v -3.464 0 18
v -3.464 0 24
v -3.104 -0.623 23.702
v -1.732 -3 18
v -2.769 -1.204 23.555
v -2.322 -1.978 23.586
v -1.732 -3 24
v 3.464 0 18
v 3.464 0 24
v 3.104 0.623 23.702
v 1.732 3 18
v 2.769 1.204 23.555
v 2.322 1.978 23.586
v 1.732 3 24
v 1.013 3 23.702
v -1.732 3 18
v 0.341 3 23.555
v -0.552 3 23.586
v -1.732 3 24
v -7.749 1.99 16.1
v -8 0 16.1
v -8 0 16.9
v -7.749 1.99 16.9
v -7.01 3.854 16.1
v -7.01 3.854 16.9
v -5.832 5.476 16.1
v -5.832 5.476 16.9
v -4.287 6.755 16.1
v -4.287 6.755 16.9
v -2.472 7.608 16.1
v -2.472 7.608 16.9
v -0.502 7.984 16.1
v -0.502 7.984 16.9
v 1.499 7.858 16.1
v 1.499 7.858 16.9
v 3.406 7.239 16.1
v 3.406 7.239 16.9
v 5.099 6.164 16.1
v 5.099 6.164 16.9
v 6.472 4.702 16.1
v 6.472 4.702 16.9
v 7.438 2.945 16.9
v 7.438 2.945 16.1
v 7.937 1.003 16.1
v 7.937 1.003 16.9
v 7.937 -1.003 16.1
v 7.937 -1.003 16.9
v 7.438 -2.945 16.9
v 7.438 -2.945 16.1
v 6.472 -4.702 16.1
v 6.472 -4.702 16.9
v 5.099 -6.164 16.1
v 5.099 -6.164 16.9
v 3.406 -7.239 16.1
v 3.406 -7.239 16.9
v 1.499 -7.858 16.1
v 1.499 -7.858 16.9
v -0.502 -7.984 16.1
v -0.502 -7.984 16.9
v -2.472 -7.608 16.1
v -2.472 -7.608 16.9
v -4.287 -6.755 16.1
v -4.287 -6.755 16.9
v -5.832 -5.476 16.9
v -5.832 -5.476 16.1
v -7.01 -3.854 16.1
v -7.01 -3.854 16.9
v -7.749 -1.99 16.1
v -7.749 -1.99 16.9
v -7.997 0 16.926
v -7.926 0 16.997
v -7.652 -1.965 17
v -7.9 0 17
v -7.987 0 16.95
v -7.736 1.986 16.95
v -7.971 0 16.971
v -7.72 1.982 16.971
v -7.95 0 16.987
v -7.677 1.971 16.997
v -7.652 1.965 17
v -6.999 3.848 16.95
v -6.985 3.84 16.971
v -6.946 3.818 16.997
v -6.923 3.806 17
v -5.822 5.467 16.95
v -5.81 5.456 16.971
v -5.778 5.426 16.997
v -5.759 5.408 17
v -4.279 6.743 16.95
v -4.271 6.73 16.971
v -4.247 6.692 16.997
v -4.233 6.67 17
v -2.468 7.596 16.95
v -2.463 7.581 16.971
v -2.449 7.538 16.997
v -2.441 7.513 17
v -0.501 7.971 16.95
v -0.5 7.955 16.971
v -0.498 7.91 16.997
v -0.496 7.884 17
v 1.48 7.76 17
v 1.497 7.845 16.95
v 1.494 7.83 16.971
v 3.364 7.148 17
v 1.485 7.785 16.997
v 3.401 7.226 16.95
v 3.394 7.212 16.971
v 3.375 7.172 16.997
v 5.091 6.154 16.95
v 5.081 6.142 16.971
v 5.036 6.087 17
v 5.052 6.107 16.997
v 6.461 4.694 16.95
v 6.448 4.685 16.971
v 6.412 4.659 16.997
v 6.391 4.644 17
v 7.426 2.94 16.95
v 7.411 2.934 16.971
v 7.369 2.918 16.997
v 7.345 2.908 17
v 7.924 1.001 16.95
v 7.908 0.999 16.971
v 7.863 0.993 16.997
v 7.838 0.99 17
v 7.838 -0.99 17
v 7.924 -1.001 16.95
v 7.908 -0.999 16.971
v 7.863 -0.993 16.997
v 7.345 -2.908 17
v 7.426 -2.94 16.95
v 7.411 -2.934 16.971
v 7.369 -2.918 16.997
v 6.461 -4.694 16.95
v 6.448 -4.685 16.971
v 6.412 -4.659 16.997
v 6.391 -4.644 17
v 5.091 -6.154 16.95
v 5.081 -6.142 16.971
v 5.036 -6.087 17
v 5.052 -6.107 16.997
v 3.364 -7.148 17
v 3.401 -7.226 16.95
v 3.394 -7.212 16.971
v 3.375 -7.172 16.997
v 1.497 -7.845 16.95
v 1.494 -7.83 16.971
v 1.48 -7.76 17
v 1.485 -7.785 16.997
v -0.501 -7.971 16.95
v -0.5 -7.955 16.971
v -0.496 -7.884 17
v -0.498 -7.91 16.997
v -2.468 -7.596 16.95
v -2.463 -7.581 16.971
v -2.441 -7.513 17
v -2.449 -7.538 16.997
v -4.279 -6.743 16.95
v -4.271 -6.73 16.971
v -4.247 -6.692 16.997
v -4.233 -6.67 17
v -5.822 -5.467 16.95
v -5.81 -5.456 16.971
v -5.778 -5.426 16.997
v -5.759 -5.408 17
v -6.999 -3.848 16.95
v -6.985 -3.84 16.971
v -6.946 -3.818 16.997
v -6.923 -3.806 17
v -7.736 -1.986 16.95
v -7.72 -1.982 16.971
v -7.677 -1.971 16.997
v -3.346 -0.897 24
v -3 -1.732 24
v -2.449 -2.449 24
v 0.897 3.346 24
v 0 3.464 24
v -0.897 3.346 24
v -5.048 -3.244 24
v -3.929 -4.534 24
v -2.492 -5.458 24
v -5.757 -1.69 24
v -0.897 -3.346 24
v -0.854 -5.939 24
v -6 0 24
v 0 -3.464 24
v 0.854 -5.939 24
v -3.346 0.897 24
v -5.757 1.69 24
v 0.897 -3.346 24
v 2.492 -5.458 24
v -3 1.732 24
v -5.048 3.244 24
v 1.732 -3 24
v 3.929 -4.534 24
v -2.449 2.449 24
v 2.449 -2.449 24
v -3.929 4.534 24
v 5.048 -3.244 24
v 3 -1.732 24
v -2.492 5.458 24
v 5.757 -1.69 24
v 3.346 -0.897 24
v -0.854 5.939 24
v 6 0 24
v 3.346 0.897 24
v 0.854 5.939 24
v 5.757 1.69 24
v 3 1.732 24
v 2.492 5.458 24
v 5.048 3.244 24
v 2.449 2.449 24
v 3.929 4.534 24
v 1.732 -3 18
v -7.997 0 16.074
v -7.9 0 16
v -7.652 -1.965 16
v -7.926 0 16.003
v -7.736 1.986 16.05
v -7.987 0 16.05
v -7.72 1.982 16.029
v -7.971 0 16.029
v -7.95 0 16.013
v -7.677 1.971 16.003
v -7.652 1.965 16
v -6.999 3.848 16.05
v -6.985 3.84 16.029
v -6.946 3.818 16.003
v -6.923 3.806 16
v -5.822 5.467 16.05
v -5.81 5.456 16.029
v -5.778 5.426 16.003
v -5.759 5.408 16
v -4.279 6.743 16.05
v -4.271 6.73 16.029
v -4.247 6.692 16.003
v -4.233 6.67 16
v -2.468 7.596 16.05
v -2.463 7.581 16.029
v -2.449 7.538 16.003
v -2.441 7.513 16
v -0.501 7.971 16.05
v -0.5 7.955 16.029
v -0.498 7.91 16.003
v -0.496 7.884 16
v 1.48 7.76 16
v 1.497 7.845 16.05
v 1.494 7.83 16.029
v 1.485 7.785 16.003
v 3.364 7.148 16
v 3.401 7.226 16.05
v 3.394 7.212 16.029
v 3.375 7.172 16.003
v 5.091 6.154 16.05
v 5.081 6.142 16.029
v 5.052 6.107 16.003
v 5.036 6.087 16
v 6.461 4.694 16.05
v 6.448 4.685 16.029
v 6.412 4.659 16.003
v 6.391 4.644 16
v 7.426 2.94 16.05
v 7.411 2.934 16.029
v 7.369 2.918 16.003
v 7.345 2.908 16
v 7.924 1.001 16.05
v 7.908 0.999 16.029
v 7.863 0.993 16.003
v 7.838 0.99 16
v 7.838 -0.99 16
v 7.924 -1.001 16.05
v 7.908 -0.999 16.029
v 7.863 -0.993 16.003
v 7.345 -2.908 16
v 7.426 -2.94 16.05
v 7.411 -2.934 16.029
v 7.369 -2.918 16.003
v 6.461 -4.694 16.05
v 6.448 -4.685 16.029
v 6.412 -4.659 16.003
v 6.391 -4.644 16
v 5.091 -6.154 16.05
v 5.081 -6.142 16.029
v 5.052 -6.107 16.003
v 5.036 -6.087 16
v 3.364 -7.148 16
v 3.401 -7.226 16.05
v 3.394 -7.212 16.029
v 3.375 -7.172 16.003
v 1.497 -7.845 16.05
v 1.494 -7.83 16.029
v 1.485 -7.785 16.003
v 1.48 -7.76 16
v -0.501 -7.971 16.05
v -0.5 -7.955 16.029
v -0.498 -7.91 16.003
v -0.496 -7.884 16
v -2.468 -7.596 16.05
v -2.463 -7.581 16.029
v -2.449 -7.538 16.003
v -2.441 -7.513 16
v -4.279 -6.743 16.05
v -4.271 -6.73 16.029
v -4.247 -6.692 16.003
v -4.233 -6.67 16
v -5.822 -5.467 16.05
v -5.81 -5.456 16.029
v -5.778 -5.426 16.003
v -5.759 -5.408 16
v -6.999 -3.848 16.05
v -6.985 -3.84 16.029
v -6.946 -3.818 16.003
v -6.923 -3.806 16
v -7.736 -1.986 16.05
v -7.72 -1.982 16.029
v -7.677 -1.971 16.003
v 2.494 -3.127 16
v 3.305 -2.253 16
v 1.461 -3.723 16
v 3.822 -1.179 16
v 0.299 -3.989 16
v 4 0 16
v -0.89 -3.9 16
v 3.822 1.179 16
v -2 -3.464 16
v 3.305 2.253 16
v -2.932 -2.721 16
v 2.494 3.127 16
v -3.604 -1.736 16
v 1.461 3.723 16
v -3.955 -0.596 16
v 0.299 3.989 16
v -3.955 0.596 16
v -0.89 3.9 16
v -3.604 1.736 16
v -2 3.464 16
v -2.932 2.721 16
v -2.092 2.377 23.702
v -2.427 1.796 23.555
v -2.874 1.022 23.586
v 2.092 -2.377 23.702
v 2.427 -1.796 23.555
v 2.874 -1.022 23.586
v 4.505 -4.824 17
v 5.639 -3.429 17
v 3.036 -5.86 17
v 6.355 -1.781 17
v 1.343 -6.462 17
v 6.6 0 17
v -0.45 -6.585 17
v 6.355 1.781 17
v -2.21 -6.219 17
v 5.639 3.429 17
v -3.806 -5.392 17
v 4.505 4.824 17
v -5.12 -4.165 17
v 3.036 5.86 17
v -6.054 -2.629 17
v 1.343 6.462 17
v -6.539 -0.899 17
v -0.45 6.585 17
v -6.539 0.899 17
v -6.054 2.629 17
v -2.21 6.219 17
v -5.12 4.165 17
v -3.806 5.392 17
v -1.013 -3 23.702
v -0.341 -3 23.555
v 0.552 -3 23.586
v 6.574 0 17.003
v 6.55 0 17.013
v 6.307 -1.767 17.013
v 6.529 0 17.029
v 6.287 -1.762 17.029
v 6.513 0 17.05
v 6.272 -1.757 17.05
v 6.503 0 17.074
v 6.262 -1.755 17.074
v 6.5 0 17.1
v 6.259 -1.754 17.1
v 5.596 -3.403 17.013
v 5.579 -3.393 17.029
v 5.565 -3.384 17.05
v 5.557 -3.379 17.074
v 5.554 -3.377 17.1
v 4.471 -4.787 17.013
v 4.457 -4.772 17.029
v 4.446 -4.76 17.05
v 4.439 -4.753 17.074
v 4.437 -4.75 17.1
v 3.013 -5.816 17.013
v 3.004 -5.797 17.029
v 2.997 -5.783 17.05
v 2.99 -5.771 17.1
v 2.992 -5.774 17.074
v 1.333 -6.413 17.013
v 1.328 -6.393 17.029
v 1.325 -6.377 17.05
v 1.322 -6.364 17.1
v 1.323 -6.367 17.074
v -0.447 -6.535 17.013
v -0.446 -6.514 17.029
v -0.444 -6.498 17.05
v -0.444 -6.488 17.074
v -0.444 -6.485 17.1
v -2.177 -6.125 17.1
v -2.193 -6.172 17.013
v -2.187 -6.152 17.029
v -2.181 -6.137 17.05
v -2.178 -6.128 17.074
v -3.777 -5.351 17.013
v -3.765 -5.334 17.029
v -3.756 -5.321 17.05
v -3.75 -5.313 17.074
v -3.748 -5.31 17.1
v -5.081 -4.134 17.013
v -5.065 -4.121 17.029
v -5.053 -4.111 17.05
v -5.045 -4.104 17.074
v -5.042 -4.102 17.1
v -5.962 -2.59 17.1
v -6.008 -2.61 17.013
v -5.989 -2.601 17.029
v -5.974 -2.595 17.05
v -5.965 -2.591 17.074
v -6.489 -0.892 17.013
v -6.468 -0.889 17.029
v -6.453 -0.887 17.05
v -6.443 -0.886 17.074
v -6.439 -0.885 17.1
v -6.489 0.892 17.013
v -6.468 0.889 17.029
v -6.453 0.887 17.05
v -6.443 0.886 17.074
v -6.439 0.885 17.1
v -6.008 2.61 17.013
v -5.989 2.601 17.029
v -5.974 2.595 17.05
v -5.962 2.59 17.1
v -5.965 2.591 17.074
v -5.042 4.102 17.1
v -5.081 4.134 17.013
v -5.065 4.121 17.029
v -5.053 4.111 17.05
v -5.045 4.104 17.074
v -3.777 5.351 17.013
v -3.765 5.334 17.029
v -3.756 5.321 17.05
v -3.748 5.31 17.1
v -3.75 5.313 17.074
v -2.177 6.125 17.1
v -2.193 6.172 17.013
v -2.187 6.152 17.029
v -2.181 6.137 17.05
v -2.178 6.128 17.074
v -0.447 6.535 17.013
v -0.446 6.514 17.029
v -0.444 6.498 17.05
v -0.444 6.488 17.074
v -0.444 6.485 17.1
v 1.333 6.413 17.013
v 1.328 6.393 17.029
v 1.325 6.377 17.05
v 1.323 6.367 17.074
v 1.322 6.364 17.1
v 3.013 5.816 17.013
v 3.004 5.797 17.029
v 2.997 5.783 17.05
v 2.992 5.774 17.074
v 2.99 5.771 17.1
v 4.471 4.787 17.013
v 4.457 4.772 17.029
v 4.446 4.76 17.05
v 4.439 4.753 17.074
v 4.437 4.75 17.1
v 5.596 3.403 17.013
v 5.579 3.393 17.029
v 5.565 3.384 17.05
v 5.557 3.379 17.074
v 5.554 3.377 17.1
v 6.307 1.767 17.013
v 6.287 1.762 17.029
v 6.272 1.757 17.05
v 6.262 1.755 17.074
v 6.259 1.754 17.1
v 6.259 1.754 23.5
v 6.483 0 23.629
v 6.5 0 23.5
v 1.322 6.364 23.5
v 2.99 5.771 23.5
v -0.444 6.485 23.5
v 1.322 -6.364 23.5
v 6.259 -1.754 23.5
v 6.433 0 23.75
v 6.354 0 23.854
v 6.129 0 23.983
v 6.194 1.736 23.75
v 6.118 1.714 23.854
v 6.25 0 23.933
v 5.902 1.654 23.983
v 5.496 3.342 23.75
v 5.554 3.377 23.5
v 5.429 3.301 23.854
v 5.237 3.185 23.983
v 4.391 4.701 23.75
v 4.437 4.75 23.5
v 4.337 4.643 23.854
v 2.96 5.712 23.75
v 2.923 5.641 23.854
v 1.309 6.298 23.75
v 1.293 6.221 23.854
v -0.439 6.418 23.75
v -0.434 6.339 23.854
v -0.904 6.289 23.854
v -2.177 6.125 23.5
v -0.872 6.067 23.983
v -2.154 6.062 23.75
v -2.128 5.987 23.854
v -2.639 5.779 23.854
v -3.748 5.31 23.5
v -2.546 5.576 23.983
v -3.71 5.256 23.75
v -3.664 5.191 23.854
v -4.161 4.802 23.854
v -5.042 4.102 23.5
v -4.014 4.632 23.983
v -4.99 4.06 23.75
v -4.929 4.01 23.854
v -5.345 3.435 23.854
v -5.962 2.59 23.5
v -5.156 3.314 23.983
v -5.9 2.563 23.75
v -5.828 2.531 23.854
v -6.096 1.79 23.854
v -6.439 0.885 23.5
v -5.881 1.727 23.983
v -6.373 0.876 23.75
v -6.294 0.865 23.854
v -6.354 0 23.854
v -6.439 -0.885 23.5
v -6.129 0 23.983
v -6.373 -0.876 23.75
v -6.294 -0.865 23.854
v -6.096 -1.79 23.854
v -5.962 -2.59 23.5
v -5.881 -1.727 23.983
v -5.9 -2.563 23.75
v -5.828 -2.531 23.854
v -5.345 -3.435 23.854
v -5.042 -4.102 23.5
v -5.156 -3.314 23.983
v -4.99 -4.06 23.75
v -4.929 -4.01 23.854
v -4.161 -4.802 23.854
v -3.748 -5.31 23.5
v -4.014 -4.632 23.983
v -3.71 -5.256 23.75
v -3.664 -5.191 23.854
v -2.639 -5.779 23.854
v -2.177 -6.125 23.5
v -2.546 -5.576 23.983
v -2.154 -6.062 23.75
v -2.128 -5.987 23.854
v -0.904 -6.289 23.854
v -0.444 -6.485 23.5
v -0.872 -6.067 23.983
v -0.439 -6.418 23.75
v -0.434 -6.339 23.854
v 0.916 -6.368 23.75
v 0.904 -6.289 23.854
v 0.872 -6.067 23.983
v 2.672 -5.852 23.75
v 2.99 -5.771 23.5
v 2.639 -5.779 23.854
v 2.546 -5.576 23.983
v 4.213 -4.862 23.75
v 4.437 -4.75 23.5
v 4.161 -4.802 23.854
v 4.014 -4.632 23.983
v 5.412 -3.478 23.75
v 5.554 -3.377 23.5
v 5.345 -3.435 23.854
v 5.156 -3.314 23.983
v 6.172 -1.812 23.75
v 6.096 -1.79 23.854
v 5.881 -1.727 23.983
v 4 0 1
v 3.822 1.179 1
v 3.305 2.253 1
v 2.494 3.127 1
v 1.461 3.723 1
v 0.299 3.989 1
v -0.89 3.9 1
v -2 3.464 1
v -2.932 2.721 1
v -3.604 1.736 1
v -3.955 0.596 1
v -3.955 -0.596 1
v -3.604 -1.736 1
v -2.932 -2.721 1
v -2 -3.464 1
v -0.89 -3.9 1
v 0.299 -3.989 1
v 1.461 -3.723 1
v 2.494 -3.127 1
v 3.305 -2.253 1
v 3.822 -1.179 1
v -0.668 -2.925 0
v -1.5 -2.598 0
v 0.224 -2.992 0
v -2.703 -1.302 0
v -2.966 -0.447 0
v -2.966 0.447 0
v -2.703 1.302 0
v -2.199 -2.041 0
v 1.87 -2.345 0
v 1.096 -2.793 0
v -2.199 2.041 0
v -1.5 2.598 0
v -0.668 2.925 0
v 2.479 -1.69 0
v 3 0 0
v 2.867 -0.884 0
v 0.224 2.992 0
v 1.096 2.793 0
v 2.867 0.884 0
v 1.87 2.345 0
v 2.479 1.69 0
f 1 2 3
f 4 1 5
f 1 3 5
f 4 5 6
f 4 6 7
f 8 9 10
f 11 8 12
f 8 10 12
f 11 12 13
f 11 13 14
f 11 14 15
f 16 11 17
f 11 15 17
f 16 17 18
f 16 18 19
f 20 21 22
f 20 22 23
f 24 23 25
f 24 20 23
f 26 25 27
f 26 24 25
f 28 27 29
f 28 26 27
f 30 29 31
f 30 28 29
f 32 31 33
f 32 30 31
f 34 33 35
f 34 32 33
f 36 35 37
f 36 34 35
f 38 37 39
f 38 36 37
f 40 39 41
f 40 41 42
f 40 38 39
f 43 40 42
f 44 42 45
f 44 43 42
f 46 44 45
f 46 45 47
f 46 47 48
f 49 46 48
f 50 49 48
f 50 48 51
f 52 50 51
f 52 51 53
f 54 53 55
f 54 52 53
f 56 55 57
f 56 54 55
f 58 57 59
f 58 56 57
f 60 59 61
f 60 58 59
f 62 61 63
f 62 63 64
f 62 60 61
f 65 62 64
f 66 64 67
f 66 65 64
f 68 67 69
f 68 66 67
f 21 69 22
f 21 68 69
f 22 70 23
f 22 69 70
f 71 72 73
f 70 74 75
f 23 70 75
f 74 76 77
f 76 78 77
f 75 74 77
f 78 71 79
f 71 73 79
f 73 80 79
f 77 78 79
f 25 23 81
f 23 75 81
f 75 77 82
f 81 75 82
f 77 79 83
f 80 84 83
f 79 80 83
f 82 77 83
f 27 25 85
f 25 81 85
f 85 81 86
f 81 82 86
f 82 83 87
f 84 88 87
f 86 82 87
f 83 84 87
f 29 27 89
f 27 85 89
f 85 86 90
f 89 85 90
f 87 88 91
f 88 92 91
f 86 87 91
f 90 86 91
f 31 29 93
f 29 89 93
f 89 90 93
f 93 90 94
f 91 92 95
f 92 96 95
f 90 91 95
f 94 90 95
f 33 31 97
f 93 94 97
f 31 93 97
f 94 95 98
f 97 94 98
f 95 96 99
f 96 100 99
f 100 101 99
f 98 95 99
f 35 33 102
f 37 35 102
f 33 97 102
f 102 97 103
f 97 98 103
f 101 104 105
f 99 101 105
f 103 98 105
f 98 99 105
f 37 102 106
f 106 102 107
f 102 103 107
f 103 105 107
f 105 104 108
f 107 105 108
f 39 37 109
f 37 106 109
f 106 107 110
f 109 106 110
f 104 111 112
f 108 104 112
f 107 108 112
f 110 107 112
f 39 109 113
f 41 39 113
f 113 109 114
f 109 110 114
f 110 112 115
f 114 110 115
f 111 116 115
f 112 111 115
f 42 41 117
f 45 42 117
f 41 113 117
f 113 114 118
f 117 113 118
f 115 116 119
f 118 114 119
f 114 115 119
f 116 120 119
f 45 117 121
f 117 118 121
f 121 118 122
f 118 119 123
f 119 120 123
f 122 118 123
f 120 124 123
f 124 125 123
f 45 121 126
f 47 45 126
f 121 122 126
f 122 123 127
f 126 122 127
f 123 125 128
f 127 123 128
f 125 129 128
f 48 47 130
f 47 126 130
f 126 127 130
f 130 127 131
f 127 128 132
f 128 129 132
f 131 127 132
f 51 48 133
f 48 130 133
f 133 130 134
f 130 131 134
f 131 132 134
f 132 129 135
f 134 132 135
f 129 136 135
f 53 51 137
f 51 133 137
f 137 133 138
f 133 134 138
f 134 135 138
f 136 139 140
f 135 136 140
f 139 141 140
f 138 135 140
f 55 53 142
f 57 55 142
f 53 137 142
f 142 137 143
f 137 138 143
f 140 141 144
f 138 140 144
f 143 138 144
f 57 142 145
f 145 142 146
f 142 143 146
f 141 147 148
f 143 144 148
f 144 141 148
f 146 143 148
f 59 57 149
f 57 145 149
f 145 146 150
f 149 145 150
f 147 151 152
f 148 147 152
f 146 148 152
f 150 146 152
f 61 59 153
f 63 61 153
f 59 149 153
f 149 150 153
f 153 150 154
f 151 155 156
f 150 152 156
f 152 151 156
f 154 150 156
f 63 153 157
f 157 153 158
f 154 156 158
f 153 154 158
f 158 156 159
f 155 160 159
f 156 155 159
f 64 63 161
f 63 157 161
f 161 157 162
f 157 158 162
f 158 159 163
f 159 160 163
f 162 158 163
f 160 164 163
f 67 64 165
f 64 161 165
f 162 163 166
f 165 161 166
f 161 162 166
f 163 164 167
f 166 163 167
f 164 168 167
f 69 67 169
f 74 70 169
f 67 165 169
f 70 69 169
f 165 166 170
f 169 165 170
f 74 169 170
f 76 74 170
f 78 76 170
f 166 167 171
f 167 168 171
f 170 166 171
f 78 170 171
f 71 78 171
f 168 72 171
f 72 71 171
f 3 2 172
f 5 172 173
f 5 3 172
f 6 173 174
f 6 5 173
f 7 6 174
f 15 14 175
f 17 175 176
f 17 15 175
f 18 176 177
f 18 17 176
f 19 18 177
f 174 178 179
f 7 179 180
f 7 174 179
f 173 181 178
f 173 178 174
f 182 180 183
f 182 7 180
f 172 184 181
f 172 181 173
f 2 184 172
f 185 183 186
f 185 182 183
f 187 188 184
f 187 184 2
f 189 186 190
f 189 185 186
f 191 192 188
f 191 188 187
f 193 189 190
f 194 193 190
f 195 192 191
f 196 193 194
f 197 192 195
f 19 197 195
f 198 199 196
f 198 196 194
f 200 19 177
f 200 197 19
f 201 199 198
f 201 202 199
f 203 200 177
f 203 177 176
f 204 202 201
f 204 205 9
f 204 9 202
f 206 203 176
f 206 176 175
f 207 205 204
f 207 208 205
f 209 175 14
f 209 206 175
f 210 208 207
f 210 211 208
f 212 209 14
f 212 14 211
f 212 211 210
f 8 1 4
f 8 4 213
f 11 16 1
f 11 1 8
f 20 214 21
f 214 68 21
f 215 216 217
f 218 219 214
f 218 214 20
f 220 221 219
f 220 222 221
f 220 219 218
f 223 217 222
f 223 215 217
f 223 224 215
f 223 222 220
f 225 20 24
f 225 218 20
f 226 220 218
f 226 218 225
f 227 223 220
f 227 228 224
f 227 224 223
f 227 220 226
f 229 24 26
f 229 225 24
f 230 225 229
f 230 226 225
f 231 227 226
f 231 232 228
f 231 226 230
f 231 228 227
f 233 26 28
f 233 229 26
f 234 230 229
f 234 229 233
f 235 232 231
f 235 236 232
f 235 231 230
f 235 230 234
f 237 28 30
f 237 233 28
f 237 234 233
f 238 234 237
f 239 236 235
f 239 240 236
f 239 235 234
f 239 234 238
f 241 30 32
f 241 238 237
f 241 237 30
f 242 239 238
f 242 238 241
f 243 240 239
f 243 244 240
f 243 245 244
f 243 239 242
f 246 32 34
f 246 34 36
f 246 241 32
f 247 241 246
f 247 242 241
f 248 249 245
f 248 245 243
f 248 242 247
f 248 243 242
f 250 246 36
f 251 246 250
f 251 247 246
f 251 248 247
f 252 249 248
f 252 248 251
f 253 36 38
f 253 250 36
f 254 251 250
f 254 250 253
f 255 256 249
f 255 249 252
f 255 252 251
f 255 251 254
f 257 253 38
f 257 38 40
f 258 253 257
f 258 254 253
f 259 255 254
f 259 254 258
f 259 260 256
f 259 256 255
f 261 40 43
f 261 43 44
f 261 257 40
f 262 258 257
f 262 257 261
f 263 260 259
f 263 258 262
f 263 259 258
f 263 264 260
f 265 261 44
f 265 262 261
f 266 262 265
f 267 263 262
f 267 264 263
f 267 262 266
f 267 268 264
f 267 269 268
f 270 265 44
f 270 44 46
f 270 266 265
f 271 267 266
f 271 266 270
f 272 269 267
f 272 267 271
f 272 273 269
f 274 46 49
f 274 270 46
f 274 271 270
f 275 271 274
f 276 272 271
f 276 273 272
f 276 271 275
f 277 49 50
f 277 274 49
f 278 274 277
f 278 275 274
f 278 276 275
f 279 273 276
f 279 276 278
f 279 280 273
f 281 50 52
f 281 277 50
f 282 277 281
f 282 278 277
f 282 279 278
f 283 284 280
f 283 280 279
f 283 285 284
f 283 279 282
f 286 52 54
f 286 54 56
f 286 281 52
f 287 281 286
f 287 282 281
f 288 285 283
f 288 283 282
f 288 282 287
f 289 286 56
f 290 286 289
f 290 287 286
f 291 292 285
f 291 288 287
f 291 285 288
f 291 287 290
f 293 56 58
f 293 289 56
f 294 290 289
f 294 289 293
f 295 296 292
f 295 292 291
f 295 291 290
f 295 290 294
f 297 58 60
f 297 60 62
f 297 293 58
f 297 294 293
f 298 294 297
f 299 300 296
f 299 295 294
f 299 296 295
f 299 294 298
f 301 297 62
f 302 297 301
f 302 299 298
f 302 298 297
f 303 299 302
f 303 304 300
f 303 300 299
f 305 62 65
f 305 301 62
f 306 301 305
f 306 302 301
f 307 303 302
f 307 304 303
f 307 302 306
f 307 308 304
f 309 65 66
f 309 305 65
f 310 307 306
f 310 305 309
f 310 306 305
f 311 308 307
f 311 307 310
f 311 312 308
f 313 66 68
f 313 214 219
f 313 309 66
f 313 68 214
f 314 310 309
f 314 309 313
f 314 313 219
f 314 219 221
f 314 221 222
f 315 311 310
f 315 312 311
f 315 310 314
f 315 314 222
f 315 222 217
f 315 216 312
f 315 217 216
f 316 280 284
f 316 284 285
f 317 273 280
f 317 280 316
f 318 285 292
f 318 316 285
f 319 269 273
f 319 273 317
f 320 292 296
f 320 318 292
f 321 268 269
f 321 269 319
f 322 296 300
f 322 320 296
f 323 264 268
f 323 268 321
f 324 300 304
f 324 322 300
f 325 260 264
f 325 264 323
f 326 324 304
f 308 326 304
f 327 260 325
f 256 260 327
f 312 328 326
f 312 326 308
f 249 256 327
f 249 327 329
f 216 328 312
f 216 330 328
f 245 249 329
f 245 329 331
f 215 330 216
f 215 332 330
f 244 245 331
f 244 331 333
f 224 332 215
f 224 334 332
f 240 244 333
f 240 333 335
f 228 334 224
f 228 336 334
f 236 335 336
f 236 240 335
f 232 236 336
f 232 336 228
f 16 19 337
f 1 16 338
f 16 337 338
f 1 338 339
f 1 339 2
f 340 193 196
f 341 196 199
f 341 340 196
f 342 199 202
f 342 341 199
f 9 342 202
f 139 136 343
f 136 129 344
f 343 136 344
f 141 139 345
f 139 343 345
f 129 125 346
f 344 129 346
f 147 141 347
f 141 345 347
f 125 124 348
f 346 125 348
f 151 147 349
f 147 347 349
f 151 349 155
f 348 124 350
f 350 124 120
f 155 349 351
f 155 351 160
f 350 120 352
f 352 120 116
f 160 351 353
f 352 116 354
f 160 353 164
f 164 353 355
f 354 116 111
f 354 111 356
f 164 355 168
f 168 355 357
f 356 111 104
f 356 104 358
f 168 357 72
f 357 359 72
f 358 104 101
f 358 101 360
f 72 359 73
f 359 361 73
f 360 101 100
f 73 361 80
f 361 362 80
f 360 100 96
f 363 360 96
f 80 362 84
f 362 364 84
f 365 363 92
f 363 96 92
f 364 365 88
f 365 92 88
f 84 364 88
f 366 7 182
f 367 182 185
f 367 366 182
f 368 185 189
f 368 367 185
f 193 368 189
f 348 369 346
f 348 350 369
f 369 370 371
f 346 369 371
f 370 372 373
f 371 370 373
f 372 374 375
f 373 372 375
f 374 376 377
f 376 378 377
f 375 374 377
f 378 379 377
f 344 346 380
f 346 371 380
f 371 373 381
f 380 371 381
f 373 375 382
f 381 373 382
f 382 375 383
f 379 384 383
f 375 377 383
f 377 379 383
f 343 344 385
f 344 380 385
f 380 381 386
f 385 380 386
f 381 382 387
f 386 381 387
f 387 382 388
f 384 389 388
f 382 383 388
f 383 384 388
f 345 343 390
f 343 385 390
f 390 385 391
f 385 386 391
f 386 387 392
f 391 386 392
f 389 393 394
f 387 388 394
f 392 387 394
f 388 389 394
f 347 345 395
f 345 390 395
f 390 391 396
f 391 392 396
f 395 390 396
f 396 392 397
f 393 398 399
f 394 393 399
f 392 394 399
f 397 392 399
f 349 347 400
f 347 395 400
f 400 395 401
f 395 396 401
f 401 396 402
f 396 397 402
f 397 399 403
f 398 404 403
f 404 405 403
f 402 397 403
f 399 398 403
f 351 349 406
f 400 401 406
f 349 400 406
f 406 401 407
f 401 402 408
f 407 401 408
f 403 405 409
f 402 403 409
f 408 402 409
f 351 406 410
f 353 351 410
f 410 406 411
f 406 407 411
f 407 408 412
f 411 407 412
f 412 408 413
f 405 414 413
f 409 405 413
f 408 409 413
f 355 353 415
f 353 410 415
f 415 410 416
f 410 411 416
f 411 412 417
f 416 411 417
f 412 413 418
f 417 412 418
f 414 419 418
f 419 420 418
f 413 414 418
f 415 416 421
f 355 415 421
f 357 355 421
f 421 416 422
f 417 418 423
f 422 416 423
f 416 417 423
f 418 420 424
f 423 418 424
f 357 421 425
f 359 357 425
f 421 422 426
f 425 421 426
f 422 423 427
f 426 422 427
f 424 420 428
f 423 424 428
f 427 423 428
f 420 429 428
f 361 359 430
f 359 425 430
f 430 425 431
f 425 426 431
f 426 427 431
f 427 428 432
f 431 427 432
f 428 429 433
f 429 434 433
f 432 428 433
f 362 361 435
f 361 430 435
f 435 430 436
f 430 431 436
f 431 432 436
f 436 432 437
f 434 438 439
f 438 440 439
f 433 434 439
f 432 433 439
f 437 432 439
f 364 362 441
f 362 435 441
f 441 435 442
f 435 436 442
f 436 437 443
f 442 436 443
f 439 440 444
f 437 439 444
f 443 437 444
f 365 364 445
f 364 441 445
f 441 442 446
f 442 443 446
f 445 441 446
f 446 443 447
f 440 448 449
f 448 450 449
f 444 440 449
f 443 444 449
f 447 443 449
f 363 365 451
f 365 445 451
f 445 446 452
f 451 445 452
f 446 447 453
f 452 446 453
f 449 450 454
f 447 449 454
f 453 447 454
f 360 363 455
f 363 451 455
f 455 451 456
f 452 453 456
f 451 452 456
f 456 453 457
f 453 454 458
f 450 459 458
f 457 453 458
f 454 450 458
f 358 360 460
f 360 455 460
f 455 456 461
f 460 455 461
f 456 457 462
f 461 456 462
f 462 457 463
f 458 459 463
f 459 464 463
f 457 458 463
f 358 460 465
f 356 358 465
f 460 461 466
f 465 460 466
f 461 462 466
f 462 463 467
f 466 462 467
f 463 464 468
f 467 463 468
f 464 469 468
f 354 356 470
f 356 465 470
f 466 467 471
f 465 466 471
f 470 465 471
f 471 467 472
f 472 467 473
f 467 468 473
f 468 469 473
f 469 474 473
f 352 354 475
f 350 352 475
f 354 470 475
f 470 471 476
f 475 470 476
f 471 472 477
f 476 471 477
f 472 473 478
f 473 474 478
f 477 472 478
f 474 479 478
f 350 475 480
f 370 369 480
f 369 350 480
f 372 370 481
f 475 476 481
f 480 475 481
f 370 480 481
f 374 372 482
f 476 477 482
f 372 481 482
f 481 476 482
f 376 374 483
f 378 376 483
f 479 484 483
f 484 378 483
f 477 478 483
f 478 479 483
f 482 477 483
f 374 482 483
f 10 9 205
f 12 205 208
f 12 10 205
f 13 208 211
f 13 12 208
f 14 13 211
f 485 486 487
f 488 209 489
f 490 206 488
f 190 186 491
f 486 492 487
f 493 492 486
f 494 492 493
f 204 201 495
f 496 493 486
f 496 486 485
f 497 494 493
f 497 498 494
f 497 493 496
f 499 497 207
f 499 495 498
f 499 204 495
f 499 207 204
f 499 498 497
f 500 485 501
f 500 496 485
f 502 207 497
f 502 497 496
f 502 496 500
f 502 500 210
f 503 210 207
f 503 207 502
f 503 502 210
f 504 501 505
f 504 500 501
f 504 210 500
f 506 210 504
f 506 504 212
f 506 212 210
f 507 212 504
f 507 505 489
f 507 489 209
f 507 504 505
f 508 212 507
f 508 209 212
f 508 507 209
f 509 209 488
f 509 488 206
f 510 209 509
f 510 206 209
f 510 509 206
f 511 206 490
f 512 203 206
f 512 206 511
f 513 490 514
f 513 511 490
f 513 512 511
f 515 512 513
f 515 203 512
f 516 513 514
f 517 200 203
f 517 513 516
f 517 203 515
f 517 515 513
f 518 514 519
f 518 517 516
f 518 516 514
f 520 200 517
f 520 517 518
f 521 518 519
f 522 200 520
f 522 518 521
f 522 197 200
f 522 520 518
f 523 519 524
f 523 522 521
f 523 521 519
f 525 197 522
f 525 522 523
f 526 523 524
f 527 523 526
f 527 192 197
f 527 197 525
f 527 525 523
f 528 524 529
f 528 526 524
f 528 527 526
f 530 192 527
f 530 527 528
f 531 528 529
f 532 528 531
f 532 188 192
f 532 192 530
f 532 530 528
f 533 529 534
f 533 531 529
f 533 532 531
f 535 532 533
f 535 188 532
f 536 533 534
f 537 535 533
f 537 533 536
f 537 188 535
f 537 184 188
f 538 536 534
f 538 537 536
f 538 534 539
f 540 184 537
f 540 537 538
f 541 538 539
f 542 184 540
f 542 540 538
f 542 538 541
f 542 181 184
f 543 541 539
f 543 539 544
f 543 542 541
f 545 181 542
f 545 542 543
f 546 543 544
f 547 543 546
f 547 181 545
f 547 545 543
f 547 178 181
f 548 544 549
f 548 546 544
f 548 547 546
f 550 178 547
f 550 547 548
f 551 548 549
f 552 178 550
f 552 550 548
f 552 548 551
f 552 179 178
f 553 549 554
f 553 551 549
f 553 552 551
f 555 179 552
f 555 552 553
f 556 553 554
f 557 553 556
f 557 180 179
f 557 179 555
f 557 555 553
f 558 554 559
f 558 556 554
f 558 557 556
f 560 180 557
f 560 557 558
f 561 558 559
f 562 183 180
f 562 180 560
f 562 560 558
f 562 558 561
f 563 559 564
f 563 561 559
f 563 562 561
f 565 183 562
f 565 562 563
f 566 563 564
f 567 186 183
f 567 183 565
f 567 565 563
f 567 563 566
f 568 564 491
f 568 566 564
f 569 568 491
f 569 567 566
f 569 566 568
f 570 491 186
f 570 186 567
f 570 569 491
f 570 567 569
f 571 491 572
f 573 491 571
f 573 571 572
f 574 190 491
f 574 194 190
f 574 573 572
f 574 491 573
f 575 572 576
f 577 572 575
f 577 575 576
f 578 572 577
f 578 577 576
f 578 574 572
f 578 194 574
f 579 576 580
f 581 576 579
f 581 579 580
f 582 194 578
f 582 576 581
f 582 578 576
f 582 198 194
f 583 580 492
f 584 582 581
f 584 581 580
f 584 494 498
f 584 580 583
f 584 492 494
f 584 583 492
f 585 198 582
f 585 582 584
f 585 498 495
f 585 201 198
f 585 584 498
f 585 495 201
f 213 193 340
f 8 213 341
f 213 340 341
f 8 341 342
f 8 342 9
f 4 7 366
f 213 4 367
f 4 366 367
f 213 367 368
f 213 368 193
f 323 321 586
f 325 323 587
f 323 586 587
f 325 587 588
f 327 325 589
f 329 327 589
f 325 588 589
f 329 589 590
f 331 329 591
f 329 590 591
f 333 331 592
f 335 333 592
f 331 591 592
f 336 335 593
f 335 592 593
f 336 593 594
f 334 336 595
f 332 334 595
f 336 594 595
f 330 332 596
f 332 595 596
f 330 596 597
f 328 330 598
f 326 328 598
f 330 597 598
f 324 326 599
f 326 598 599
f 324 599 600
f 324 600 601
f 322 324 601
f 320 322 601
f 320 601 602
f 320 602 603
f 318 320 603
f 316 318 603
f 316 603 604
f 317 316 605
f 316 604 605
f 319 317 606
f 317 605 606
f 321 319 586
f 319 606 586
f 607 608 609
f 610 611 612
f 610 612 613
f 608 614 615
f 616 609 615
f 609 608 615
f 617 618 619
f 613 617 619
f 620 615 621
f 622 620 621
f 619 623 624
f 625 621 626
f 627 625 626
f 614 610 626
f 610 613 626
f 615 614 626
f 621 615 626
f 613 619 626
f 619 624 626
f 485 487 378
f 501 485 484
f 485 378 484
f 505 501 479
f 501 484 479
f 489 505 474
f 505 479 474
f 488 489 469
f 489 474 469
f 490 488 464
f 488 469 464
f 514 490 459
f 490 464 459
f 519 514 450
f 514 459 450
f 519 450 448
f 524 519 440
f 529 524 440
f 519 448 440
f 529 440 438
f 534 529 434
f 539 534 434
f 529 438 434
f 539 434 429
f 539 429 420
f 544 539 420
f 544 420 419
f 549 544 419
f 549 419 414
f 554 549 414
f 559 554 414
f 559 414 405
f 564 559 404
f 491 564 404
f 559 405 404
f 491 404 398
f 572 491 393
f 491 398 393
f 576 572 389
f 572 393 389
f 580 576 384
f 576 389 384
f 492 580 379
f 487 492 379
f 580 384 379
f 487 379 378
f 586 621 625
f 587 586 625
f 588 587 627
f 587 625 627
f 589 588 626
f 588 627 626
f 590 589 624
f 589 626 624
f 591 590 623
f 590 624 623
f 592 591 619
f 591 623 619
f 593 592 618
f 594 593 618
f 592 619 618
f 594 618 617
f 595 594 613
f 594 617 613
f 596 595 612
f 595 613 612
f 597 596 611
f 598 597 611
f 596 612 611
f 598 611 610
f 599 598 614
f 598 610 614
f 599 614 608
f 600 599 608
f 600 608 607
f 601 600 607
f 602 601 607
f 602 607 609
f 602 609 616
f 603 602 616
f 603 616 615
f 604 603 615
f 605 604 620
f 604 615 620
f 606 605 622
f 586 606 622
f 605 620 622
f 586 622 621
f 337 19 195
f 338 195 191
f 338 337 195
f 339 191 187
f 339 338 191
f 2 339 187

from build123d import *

# Parameters (mm, degrees)
SCHIZZO1_R                   = 4
ESTRUSIONE_ESTRUSIONE1_DEPTH = 16
SMUSSO1_SIZE                 = 1
SCHIZZO6_R                   = 6.5
ESTRUSIONE_ESTRUSIONE3_DEPTH = 8
TAGLIO_ESTRUSIONE3_DEPTH     = 6
SCHIZZO8_R                   = 3.464101615
TAGLIO_ESTRUSIONE4_DEPTH     = 1
TAGLIO_ESTRUSIONE4_TAPER     = 45
RACCORDO1_R                  = 0.5
SCHIZZO9_R                   = 8
SCHIZZO9_R_2                 = 6.5
ESTRUSIONE_ESTRUSIONE4_DEPTH = 1
RACCORDO2_R                  = 0.1


with BuildPart() as part:
    # Schizzo1 → Estrusione-Estrusione1 (new body)
    with BuildSketch(Plane.XY):
        Circle(SCHIZZO1_R)
    extrude(amount=ESTRUSIONE_ESTRUSIONE1_DEPTH)

    # Smusso1
    smusso1_edges = [part.edges().sort_by_distance(p)[0] for p in [
        (-4, 0, 0),
    ]]
    chamfer(smusso1_edges, length=SMUSSO1_SIZE)

    # Schizzo6 → Estrusione-Estrusione3 (add)
    with BuildSketch(Plane.XY.offset(16)):
        Circle(SCHIZZO6_R)
    extrude(amount=ESTRUSIONE_ESTRUSIONE3_DEPTH)

    # Schizzo7 → Taglio-Estrusione3 (cut)
    with BuildSketch(Plane.XY.offset(24)):
        Polygon((1.732050808, 3), (-1.732050808, 3), (-3.464101615, 0), (-1.732050808, -3), (1.732050808, -3), (3.464101615, 0), align=None)
    extrude(amount=-TAGLIO_ESTRUSIONE3_DEPTH, mode=Mode.SUBTRACT)

    # Schizzo8 → Taglio-Estrusione4 (cut)
    with BuildSketch(Plane.XY.offset(24)):
        Circle(SCHIZZO8_R)
    extrude(amount=-TAGLIO_ESTRUSIONE4_DEPTH, taper=TAGLIO_ESTRUSIONE4_TAPER, mode=Mode.SUBTRACT)

    # Raccordo1
    raccordo1_edges = [part.edges().sort_by_distance(p)[0] for p in [
        (-6.5, 0, 24),
    ]]
    fillet(raccordo1_edges, radius=RACCORDO1_R)

    # Schizzo9 → Estrusione-Estrusione4 (add)
    with BuildSketch(Plane(origin=(0, 0, 16), x_dir=(-1, 0, 0), z_dir=(0, 0, -1))):
        Circle(SCHIZZO9_R)
        Circle(SCHIZZO9_R_2, mode=Mode.SUBTRACT)
    extrude(amount=-ESTRUSIONE_ESTRUSIONE4_DEPTH)

    # Raccordo2
    raccordo2_edges = [part.edges().sort_by_distance(p)[0] for p in [
        (-6.5, 0, 17),
        (8, 0, 17),
        (8, 0, 16),
    ]]
    fillet(raccordo2_edges, radius=RACCORDO2_R)


solid = part.part
